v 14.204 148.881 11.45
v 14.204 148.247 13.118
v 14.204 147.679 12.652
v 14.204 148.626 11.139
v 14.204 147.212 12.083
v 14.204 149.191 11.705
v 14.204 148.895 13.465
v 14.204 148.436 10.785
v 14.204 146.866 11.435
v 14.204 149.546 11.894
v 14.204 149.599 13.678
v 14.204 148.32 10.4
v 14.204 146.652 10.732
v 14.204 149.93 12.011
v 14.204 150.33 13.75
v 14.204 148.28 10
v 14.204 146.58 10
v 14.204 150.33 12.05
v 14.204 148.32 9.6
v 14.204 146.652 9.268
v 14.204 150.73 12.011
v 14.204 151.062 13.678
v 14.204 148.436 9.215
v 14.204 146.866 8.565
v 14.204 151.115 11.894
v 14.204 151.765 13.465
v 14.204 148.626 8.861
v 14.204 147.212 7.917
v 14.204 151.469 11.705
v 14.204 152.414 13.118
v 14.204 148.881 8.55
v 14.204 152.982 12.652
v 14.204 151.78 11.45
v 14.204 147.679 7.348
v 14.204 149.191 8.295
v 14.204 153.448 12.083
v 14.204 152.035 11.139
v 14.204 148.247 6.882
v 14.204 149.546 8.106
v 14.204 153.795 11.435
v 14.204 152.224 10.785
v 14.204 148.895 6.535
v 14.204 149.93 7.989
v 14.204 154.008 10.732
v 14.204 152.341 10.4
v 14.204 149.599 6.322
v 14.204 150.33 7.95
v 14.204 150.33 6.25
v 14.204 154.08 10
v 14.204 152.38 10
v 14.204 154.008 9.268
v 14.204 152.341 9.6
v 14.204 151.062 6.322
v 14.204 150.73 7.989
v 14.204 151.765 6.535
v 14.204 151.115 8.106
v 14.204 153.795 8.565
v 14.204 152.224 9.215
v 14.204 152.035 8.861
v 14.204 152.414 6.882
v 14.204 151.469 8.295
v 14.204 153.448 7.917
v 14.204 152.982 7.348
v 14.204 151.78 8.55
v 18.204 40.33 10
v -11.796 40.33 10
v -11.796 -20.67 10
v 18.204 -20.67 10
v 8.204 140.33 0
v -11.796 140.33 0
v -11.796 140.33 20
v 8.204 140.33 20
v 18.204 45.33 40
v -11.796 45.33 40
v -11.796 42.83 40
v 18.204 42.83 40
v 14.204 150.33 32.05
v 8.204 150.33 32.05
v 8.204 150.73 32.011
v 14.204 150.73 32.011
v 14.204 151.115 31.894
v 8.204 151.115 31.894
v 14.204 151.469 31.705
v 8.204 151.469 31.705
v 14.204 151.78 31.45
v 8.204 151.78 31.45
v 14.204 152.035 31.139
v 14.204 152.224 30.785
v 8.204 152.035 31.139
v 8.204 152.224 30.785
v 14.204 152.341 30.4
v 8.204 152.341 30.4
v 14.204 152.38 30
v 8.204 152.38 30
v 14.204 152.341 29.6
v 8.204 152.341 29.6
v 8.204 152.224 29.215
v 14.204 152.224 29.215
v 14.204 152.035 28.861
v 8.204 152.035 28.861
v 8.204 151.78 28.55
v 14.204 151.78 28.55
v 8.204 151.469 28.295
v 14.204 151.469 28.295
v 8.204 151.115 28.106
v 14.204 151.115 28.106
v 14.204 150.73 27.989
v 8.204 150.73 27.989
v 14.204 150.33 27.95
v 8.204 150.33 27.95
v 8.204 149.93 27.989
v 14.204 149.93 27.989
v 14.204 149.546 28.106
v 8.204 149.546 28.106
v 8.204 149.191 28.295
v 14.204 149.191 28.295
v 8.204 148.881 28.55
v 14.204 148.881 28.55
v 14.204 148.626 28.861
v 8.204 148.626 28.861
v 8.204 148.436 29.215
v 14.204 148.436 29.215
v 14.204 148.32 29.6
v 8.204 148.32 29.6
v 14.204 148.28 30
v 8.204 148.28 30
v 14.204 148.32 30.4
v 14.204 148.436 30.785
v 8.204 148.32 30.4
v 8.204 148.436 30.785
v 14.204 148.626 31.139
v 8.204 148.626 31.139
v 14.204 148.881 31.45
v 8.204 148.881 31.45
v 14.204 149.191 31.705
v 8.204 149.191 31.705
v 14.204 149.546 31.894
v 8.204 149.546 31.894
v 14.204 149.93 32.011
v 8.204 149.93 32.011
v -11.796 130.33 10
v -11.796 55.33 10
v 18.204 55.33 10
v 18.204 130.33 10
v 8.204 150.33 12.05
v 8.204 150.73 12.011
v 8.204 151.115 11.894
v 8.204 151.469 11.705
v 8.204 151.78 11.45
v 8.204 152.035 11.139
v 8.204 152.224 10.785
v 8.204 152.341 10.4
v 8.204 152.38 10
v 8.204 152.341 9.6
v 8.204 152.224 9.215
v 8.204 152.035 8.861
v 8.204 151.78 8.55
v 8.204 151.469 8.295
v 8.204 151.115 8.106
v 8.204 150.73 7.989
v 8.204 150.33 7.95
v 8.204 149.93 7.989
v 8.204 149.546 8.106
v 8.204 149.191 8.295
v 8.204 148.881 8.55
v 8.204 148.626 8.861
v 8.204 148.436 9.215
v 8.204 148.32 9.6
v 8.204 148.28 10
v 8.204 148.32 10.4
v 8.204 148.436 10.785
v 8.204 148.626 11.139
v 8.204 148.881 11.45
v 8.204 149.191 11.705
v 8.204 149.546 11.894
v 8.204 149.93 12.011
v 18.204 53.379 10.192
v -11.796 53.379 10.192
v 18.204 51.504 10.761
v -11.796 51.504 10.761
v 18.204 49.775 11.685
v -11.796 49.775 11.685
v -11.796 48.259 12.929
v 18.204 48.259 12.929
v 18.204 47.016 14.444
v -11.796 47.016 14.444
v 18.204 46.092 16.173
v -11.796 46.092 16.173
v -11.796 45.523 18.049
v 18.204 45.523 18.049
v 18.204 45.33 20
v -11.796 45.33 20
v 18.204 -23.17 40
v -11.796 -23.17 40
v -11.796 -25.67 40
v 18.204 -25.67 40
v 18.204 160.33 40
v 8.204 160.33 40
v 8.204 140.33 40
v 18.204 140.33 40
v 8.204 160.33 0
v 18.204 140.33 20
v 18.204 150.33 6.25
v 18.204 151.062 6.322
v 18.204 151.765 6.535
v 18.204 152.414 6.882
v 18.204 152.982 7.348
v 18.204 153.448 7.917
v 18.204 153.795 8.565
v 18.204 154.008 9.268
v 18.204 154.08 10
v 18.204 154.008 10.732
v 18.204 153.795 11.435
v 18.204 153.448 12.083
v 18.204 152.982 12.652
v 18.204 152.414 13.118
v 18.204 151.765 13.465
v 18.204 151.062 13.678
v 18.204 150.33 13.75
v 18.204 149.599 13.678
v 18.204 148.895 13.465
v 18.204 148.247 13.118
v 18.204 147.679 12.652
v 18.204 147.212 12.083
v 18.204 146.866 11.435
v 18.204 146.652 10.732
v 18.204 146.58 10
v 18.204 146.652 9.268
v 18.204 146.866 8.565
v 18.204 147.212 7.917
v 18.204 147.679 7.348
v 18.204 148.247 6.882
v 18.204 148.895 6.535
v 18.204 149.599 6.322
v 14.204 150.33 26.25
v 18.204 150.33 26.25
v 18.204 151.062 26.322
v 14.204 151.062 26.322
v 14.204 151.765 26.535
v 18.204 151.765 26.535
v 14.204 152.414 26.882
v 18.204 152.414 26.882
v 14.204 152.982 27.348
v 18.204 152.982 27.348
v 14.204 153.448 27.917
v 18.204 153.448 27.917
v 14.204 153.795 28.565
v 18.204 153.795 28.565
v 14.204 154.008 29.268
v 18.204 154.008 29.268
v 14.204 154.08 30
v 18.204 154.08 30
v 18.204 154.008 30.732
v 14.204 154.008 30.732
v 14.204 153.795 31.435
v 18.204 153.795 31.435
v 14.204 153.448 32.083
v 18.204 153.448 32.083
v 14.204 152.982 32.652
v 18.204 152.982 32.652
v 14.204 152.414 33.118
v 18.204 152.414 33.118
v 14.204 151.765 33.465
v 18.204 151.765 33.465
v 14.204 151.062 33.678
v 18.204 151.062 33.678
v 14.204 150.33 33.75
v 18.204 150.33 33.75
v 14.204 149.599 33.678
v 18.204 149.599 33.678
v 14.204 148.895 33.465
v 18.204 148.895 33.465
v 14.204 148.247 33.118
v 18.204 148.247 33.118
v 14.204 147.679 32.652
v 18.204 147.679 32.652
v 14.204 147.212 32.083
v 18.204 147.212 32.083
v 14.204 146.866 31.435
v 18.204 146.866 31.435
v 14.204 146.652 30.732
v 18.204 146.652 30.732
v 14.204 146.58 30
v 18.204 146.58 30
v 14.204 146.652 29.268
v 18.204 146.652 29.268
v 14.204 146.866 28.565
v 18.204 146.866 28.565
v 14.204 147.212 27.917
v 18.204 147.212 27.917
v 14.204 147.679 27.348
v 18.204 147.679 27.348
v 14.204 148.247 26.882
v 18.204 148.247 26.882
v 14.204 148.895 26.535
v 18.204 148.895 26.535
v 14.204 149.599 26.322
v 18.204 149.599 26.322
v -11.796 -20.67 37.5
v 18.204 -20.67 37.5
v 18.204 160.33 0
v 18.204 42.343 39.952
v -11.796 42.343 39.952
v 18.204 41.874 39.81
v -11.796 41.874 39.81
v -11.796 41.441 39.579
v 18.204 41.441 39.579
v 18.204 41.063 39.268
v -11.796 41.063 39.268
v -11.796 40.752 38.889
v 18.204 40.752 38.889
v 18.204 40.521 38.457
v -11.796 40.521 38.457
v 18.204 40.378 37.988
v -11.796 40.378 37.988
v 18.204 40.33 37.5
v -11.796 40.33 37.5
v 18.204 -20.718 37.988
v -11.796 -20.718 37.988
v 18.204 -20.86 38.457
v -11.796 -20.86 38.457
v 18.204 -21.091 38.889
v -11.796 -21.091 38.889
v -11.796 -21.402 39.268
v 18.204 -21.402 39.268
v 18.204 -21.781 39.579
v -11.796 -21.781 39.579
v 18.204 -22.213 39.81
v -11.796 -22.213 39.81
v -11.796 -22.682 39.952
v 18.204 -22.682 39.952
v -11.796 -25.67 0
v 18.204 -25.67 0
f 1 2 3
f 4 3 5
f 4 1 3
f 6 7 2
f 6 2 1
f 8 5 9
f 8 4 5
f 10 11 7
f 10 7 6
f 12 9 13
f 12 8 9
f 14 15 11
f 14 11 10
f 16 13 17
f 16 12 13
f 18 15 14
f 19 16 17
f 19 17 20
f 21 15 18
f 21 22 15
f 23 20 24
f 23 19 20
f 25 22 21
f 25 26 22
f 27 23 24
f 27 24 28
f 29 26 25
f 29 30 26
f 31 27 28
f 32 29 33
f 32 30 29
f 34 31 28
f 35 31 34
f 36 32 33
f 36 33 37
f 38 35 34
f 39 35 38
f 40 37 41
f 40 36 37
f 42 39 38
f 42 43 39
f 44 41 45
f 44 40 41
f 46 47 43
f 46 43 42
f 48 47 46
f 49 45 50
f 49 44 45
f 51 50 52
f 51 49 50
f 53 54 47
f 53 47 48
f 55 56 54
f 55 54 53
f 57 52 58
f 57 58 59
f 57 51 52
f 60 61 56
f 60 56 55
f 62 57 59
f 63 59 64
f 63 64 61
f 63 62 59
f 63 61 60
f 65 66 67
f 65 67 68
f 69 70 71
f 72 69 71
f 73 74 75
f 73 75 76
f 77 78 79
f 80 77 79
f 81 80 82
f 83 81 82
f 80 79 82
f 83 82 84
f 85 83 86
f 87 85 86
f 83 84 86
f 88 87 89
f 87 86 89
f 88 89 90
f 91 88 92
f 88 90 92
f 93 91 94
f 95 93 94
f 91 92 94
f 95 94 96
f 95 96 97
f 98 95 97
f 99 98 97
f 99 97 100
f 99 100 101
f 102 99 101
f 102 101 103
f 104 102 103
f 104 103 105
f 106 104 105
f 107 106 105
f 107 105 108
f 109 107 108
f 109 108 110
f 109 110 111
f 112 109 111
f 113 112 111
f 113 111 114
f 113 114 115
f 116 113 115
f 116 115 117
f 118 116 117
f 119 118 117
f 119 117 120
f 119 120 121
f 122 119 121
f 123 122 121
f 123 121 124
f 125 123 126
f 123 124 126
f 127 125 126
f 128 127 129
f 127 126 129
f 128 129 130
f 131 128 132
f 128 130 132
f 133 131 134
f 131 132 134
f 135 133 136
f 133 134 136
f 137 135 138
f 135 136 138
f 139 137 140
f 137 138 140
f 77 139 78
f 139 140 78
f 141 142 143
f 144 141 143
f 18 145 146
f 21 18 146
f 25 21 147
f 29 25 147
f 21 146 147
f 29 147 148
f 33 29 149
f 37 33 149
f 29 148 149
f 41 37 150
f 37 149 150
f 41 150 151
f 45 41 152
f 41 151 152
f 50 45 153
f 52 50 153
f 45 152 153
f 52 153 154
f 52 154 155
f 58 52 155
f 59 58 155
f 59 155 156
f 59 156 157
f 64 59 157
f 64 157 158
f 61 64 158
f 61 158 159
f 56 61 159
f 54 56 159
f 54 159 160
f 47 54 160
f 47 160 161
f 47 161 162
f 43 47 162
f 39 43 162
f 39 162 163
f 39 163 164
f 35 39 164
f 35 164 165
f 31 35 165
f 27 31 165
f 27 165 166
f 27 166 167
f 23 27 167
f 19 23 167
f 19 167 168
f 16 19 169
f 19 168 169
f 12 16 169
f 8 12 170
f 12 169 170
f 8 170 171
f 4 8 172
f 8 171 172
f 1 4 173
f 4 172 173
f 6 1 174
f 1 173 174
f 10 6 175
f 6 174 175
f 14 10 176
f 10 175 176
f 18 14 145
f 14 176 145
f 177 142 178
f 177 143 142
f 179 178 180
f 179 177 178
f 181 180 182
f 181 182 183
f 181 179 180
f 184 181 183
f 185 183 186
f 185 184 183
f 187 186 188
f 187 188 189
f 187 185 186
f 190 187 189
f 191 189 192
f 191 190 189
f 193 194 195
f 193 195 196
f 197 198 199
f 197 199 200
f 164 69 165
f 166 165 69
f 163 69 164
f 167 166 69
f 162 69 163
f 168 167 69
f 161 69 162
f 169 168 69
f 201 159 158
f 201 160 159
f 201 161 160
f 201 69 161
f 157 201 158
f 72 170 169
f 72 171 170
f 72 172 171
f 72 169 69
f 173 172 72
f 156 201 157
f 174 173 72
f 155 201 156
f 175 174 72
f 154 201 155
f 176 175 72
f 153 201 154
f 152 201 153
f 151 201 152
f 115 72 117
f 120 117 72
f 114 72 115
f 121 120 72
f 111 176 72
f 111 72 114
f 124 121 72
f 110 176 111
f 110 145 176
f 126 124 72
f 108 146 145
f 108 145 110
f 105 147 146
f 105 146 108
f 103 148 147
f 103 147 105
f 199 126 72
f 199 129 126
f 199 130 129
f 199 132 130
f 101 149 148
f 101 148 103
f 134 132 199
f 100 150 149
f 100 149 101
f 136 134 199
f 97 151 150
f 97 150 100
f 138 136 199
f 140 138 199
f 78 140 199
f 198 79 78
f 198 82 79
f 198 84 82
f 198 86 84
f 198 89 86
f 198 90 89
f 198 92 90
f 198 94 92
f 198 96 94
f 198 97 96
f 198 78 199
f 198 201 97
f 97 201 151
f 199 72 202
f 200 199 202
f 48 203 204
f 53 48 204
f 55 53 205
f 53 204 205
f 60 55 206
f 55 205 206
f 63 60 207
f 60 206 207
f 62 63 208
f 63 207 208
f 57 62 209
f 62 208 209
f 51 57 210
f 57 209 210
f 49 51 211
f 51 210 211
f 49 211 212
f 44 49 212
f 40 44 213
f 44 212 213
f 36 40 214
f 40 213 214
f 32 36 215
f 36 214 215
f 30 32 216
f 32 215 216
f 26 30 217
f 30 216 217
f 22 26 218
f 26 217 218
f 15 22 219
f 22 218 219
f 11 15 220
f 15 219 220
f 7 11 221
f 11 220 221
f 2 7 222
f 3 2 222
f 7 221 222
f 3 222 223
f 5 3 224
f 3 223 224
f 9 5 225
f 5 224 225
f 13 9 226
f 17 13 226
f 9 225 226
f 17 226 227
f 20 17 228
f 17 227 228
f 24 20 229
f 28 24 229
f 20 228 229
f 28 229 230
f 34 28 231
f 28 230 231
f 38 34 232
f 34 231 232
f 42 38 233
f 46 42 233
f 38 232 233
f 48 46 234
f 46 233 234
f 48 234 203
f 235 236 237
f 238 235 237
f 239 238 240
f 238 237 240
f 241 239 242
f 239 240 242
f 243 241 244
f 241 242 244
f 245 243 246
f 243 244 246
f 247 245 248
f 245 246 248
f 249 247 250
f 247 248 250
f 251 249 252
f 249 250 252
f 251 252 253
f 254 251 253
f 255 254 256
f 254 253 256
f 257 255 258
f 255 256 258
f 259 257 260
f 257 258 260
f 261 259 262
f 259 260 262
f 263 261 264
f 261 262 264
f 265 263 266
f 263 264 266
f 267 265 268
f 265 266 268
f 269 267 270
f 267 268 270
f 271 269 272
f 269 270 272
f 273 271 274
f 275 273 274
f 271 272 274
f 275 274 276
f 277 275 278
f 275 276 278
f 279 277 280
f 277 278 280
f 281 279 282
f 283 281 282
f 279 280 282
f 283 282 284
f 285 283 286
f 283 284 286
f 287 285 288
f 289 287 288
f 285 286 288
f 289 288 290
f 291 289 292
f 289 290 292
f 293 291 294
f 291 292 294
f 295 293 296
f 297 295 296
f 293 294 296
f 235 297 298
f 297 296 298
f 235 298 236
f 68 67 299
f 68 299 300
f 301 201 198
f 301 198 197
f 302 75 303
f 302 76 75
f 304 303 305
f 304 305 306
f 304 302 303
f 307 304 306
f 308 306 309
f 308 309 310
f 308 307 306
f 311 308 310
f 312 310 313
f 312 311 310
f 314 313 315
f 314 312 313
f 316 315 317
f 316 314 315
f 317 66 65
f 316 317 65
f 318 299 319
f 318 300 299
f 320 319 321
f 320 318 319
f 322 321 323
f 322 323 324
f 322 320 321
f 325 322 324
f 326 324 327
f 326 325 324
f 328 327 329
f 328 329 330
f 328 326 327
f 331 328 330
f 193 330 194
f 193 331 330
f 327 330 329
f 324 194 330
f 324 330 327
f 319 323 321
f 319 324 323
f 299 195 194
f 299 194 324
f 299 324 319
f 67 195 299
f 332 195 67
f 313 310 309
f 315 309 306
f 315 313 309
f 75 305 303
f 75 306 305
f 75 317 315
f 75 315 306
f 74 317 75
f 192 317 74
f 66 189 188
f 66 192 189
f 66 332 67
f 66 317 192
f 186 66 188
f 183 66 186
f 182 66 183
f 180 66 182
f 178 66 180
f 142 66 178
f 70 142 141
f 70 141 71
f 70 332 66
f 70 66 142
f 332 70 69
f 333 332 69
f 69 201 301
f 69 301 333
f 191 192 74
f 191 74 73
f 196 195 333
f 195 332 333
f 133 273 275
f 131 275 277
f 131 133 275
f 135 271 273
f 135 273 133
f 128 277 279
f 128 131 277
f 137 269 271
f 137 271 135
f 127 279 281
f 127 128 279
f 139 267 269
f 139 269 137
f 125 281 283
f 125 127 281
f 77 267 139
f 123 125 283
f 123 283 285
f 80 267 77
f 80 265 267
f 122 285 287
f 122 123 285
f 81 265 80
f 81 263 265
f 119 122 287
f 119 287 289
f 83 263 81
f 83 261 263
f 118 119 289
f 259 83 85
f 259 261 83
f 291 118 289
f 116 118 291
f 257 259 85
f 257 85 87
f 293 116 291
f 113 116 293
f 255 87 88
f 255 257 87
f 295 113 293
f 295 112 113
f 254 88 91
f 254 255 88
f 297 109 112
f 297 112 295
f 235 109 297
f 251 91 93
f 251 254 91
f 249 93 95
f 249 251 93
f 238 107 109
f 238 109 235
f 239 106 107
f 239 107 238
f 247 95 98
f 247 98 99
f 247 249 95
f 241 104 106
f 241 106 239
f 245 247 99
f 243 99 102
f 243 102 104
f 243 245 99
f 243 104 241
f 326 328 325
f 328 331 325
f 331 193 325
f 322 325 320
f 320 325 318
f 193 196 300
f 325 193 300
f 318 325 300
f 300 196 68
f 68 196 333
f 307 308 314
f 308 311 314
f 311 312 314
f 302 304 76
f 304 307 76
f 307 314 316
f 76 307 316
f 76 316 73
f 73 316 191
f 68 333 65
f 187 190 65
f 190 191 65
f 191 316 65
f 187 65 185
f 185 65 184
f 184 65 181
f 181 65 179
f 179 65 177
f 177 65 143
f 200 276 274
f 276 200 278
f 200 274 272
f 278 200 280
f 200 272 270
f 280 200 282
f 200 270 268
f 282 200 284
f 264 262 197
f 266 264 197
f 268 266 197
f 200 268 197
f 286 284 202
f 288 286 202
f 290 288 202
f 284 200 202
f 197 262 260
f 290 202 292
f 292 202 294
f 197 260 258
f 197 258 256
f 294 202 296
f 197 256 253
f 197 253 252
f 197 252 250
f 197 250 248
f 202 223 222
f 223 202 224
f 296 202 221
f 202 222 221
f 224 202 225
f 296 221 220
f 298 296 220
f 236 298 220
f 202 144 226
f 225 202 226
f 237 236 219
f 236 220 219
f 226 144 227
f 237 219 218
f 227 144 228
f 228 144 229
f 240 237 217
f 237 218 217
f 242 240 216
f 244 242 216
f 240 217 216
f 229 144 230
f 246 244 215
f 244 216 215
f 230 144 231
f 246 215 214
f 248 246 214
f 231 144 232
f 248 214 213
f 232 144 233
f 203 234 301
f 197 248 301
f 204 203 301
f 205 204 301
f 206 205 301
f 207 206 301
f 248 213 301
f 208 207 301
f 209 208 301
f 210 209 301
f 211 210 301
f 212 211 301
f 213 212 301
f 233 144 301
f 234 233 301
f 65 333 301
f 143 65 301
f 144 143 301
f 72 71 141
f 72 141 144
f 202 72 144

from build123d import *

# Parameters (mm, degrees)
SKETCH_1_W          = 30
SKETCH_1_H          = 186
EXTRUDE_1_DEPTH     = 10
SKETCH_2_W          = 30
SKETCH_2_H          = 5
SKETCH_2_H_2        = 20
EXTRUDE_2_DEPTH     = 30
FILLET_1_R          = 2.5
FILLET_4_R          = 10
CHAMFER_7_SIZE      = 10
SKETCH_3_W          = 40
SKETCH_3_H          = 20
CUT_EXTRUDE_1_DEPTH = 20
SKETCH_7_R          = 2.05
CUT_EXTRUDE_3_DEPTH = 10
SKETCH_8_R          = 3.75
CUT_EXTRUDE_4_DEPTH = 4


with BuildPart() as part:
    # 草圖1 → 填料-伸長1 (new body)
    with BuildSketch(Plane.XY):
        with Locations((3.2037008, 67.330357143)):
            Rectangle(SKETCH_1_W, SKETCH_1_H)
    extrude(amount=EXTRUDE_1_DEPTH)

    # 草圖2 → 填料-伸長2 (add)
    with BuildSketch(Plane.XY.offset(10)):
        with Locations((3.2037008, -23.169642857)):
            Rectangle(SKETCH_2_W, SKETCH_2_H)
        with Locations((3.2037008, 42.830357143)):
            Rectangle(SKETCH_2_W, SKETCH_2_H)
        with Locations((3.2037008, 150.330357143)):
            Rectangle(SKETCH_2_W, SKETCH_2_H_2)
    extrude(amount=EXTRUDE_2_DEPTH)

    # 圓角1
    fillet_1_edges = [part.edges().sort_by_distance(p)[0] for p in [
        (3.2037008, -20.669642857, 40),
        (3.2037008, 40.330357143, 40),
    ]]
    fillet(fillet_1_edges, radius=FILLET_1_R)

    # 圓角4
    fillet_4_edges = [part.edges().sort_by_distance(p)[0] for p in [
        (3.2037008, 45.330357143, 10),
    ]]
    fillet(fillet_4_edges, radius=FILLET_4_R)

    # 導角7
    chamfer_7_edges = [part.edges().sort_by_distance(p)[0] for p in [
        (3.2037008, 140.330357143, 10),
    ]]
    chamfer(chamfer_7_edges, length=CHAMFER_7_SIZE)

    # 草圖3 → 除料-伸長1 (cut)
    with BuildSketch(Plane.ZY.offset(11.7962992)):
        with Locations((20, 150.330357143)):
            Rectangle(SKETCH_3_W, SKETCH_3_H)
    extrude(amount=-CUT_EXTRUDE_1_DEPTH, mode=Mode.SUBTRACT)

    # 草圖7 → 除料-伸長3 (cut)
    with BuildSketch(Plane.ZY.offset(-8.2037008)):
        with Locations((30, 150.330357143)):
            Circle(SKETCH_7_R)
        with Locations((10, 150.330357143)):
            Circle(SKETCH_7_R)
    extrude(amount=-CUT_EXTRUDE_3_DEPTH, mode=Mode.SUBTRACT)

    # 草圖8 → 除料-伸長4 (cut)
    with BuildSketch(Plane(origin=(18.2037008, 0, 0), x_dir=(0, 0, -1), z_dir=(1, 0, 0))):
        with Locations((-30, 150.330357143)):
            Circle(SKETCH_8_R)
        with Locations((-10, 150.330357143)):
            Circle(SKETCH_8_R)
    extrude(amount=-CUT_EXTRUDE_4_DEPTH, mode=Mode.SUBTRACT)


solid = part.part
